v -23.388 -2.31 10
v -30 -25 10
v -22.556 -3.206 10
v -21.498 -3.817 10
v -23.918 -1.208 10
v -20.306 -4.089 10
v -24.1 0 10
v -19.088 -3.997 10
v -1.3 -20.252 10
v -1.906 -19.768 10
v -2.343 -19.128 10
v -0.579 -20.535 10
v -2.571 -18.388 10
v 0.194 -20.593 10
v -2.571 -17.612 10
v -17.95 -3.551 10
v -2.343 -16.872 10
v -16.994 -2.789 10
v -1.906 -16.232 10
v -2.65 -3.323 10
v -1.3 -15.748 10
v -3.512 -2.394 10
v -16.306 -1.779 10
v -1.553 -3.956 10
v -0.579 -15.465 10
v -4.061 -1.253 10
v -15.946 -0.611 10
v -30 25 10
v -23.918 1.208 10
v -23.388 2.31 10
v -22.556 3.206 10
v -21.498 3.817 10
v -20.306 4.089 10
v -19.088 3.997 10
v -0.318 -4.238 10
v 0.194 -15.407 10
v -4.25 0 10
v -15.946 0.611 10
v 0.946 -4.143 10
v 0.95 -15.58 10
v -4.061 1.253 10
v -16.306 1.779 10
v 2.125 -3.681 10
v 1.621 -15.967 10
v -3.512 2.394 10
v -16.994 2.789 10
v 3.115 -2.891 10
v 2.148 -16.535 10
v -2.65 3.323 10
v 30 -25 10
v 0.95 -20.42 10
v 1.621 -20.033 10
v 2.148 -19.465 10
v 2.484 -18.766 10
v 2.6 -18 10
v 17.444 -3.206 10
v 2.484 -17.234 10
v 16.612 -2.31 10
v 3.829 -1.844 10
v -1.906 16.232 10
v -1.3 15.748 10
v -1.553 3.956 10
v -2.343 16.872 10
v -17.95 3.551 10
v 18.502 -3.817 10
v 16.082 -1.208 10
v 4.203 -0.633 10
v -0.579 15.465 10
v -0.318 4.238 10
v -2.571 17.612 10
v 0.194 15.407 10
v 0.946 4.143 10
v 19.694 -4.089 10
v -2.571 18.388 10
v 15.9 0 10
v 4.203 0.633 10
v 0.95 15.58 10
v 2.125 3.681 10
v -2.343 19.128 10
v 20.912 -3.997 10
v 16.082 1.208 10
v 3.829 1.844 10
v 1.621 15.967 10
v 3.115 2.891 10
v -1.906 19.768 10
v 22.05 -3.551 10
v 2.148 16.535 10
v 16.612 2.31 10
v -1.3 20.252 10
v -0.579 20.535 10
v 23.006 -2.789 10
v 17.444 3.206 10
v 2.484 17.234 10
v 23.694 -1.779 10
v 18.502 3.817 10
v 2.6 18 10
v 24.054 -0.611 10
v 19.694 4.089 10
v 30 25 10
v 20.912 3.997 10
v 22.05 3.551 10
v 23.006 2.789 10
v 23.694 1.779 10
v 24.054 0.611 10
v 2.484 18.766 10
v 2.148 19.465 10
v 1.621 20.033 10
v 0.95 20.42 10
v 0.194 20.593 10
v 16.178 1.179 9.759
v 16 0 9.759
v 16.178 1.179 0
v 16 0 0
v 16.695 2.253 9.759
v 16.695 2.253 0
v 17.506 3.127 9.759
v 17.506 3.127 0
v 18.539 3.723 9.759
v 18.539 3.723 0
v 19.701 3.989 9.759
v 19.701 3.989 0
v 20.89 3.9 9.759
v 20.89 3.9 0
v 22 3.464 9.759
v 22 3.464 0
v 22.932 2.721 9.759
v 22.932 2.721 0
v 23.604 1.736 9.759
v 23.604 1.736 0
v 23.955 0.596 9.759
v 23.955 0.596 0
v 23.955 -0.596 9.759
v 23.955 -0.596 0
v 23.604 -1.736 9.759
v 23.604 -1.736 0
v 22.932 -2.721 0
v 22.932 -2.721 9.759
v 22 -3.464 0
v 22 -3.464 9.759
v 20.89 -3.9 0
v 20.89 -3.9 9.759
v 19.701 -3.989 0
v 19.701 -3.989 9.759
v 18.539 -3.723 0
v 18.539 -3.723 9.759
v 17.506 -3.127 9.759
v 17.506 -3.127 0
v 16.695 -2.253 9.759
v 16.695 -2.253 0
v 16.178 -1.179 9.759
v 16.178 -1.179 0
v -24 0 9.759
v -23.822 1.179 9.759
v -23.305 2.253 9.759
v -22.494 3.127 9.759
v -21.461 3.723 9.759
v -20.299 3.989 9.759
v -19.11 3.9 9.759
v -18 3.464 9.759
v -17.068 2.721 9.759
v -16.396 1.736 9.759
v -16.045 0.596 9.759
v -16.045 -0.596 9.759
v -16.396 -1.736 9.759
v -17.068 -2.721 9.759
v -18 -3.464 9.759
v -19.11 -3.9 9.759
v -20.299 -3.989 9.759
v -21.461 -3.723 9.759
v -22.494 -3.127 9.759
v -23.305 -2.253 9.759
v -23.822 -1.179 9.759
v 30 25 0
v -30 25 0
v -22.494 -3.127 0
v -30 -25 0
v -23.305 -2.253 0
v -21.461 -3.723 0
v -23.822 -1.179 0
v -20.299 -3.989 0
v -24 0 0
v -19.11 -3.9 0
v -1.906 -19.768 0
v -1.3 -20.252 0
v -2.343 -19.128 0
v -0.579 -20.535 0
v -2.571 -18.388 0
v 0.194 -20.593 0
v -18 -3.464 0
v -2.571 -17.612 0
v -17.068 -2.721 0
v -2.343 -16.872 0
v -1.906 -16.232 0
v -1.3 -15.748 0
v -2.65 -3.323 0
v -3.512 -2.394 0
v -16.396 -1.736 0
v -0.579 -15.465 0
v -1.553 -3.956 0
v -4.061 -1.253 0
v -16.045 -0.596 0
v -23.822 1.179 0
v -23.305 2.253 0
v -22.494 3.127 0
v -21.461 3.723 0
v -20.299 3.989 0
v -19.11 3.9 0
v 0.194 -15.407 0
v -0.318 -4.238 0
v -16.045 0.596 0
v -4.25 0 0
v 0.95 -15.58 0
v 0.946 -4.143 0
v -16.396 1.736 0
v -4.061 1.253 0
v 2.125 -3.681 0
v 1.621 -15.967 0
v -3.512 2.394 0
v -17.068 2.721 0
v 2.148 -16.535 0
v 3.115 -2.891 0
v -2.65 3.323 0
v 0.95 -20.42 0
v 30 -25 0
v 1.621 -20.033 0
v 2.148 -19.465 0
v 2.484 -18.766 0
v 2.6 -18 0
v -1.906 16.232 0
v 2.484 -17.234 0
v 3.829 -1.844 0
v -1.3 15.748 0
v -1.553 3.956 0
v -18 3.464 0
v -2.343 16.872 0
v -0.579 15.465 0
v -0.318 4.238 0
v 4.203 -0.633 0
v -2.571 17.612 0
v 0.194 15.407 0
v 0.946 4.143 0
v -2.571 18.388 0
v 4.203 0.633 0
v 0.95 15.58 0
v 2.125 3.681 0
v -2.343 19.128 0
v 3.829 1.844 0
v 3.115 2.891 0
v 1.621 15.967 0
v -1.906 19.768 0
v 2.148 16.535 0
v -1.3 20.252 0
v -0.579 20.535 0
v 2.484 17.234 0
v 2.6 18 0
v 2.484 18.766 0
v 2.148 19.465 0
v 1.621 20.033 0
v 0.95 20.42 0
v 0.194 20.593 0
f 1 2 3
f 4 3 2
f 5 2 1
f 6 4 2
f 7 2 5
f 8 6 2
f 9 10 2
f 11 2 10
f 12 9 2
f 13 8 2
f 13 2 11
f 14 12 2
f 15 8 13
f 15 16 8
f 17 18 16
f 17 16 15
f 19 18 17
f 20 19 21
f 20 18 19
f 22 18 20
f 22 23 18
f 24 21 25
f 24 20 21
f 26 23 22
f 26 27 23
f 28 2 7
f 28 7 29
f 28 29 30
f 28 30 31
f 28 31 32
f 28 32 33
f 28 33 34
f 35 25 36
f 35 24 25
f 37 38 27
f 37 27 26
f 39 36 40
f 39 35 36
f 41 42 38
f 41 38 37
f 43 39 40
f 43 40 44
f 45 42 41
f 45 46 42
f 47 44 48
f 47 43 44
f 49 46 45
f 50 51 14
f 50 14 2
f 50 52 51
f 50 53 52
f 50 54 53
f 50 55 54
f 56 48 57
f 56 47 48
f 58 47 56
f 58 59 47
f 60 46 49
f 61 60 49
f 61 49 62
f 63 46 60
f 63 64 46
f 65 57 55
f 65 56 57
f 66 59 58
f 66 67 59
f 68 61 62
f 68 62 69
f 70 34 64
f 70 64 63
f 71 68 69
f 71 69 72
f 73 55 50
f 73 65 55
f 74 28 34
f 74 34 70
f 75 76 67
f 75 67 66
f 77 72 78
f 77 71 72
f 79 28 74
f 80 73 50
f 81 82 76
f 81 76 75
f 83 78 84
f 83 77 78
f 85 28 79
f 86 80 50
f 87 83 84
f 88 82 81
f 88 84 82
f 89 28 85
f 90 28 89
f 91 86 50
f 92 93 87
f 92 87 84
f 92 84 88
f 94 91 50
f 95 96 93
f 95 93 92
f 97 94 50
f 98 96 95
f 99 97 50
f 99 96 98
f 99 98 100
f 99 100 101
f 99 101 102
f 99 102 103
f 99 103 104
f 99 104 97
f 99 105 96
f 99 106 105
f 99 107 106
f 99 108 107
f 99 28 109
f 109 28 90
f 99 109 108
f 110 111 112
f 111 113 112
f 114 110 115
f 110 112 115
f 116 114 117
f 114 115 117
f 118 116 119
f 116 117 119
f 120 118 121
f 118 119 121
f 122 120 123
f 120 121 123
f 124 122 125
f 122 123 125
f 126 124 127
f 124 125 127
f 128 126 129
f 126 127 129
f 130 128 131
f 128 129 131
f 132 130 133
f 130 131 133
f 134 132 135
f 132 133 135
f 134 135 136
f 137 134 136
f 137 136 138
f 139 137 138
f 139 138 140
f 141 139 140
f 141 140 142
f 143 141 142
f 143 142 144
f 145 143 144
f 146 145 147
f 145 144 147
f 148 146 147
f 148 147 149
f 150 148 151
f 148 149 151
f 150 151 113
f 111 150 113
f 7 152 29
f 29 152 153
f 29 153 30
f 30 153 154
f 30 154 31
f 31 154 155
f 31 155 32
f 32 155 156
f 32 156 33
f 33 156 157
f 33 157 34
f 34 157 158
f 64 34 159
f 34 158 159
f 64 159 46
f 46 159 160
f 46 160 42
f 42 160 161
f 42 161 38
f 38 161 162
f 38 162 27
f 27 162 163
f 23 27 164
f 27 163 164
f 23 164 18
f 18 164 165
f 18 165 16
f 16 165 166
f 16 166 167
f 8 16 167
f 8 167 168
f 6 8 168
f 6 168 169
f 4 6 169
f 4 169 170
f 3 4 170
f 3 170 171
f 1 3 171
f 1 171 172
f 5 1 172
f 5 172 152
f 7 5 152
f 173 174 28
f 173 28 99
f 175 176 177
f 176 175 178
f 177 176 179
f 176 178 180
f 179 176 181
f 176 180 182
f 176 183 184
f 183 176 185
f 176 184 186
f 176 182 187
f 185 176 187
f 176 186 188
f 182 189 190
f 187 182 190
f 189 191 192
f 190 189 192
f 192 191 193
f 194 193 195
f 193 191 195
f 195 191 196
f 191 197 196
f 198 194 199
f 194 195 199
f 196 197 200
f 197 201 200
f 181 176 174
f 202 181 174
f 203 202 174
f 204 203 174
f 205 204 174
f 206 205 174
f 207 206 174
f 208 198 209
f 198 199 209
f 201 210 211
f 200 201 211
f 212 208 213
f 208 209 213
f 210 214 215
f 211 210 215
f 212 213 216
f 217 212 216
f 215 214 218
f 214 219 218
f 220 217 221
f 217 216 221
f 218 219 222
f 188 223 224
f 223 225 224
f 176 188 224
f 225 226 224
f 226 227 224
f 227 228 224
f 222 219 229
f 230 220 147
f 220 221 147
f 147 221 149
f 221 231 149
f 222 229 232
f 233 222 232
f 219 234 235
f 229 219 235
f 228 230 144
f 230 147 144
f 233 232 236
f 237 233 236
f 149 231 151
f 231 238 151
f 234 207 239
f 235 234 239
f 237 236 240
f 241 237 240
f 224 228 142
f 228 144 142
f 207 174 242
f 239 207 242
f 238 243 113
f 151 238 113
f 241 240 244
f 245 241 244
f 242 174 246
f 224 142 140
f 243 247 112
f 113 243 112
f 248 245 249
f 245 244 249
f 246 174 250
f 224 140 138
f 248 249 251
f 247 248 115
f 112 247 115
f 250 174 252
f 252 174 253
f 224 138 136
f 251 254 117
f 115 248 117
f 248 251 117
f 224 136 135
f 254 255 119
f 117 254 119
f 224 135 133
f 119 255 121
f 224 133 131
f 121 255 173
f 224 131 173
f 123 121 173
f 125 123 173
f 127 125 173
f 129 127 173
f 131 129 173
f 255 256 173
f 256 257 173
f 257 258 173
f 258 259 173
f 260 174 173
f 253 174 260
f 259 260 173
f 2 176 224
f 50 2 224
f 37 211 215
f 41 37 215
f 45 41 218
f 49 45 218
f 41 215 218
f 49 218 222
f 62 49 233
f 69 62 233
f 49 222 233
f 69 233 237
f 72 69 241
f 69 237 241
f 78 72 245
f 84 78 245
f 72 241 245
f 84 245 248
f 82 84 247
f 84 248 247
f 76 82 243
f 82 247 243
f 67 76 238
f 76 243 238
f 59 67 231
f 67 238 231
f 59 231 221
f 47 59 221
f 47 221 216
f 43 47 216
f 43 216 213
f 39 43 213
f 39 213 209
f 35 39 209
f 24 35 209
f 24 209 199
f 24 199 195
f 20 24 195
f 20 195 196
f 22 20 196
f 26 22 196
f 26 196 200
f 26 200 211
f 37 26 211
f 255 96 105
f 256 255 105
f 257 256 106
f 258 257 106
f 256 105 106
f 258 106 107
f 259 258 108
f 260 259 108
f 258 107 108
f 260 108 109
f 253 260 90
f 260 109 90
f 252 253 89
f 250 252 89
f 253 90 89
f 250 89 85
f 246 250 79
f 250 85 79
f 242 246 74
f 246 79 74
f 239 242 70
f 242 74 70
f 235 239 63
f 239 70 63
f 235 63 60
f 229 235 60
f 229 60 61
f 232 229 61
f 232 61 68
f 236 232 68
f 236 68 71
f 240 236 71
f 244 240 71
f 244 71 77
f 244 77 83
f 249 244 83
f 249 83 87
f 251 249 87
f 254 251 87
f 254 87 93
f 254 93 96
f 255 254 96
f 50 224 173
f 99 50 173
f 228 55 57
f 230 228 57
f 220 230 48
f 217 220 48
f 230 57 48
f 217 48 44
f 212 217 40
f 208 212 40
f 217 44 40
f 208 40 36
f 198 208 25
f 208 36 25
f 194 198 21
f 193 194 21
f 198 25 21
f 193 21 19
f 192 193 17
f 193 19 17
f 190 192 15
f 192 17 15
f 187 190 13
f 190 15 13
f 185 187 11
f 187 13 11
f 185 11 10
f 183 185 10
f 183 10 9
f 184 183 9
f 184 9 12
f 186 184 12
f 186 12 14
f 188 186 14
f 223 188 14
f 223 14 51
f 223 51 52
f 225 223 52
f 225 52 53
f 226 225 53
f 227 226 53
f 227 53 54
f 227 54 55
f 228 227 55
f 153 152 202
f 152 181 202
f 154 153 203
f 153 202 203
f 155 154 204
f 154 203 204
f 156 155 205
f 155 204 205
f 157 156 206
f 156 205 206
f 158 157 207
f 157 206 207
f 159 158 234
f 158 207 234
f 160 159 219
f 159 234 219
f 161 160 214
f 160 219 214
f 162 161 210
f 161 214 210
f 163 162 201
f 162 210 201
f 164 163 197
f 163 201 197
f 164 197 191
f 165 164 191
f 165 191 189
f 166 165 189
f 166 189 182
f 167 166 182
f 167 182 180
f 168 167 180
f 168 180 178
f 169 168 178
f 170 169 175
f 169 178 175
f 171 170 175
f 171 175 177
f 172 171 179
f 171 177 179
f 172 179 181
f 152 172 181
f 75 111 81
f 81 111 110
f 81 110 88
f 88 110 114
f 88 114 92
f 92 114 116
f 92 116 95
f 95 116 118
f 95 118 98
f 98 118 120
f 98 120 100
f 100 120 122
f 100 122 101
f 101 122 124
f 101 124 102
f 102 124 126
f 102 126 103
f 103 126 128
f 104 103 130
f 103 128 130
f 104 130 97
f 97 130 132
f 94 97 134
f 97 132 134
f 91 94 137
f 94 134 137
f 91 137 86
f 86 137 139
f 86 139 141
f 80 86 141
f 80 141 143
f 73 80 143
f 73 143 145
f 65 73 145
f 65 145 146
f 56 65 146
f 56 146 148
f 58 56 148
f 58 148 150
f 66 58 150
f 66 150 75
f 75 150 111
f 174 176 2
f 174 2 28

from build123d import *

# Parameters (mm, degrees)
SKETCH_1_W                = 60
SKETCH_1_H                = 50
EXTRUDE_1_DEPTH           = 10
HOLE_WIZARD_1_D           = 8.5
HOLE_WIZARD_1_DEPTH       = 20
HOLE_WIZARD_2_D           = 8
HOLE_WIZARD_2_CSINK_D     = 8.2
HOLE_WIZARD_2_CSINK_ANGLE = 45
HOLE_WIZARD_3_D           = 5.2


with BuildPart() as part:
    # 草图1 → 凸台-拉伸1 (new body)
    with BuildSketch(Plane.XY):
        Rectangle(SKETCH_1_W, SKETCH_1_H)
    extrude(amount=EXTRUDE_1_DEPTH)

    # 孔1
    with Locations(Plane.XY.offset(10)):
        with Locations((0, 0)):
            Hole(HOLE_WIZARD_1_D / 2, depth=HOLE_WIZARD_1_DEPTH)

    # 孔2 (through all)
    with Locations(Plane.XY.offset(10)):
        with Locations((20, 0), (-20, 0)):
            CounterSinkHole(HOLE_WIZARD_2_D / 2, HOLE_WIZARD_2_CSINK_D / 2, counter_sink_angle=HOLE_WIZARD_2_CSINK_ANGLE)

    # 孔3 (through all)
    with Locations(Plane(origin=(0, 0, 0), x_dir=(-1, 0, 0), z_dir=(0, 0, -1))):
        with Locations((0, 18), (0, -18)):
            Hole(HOLE_WIZARD_3_D / 2)


solid = part.part
